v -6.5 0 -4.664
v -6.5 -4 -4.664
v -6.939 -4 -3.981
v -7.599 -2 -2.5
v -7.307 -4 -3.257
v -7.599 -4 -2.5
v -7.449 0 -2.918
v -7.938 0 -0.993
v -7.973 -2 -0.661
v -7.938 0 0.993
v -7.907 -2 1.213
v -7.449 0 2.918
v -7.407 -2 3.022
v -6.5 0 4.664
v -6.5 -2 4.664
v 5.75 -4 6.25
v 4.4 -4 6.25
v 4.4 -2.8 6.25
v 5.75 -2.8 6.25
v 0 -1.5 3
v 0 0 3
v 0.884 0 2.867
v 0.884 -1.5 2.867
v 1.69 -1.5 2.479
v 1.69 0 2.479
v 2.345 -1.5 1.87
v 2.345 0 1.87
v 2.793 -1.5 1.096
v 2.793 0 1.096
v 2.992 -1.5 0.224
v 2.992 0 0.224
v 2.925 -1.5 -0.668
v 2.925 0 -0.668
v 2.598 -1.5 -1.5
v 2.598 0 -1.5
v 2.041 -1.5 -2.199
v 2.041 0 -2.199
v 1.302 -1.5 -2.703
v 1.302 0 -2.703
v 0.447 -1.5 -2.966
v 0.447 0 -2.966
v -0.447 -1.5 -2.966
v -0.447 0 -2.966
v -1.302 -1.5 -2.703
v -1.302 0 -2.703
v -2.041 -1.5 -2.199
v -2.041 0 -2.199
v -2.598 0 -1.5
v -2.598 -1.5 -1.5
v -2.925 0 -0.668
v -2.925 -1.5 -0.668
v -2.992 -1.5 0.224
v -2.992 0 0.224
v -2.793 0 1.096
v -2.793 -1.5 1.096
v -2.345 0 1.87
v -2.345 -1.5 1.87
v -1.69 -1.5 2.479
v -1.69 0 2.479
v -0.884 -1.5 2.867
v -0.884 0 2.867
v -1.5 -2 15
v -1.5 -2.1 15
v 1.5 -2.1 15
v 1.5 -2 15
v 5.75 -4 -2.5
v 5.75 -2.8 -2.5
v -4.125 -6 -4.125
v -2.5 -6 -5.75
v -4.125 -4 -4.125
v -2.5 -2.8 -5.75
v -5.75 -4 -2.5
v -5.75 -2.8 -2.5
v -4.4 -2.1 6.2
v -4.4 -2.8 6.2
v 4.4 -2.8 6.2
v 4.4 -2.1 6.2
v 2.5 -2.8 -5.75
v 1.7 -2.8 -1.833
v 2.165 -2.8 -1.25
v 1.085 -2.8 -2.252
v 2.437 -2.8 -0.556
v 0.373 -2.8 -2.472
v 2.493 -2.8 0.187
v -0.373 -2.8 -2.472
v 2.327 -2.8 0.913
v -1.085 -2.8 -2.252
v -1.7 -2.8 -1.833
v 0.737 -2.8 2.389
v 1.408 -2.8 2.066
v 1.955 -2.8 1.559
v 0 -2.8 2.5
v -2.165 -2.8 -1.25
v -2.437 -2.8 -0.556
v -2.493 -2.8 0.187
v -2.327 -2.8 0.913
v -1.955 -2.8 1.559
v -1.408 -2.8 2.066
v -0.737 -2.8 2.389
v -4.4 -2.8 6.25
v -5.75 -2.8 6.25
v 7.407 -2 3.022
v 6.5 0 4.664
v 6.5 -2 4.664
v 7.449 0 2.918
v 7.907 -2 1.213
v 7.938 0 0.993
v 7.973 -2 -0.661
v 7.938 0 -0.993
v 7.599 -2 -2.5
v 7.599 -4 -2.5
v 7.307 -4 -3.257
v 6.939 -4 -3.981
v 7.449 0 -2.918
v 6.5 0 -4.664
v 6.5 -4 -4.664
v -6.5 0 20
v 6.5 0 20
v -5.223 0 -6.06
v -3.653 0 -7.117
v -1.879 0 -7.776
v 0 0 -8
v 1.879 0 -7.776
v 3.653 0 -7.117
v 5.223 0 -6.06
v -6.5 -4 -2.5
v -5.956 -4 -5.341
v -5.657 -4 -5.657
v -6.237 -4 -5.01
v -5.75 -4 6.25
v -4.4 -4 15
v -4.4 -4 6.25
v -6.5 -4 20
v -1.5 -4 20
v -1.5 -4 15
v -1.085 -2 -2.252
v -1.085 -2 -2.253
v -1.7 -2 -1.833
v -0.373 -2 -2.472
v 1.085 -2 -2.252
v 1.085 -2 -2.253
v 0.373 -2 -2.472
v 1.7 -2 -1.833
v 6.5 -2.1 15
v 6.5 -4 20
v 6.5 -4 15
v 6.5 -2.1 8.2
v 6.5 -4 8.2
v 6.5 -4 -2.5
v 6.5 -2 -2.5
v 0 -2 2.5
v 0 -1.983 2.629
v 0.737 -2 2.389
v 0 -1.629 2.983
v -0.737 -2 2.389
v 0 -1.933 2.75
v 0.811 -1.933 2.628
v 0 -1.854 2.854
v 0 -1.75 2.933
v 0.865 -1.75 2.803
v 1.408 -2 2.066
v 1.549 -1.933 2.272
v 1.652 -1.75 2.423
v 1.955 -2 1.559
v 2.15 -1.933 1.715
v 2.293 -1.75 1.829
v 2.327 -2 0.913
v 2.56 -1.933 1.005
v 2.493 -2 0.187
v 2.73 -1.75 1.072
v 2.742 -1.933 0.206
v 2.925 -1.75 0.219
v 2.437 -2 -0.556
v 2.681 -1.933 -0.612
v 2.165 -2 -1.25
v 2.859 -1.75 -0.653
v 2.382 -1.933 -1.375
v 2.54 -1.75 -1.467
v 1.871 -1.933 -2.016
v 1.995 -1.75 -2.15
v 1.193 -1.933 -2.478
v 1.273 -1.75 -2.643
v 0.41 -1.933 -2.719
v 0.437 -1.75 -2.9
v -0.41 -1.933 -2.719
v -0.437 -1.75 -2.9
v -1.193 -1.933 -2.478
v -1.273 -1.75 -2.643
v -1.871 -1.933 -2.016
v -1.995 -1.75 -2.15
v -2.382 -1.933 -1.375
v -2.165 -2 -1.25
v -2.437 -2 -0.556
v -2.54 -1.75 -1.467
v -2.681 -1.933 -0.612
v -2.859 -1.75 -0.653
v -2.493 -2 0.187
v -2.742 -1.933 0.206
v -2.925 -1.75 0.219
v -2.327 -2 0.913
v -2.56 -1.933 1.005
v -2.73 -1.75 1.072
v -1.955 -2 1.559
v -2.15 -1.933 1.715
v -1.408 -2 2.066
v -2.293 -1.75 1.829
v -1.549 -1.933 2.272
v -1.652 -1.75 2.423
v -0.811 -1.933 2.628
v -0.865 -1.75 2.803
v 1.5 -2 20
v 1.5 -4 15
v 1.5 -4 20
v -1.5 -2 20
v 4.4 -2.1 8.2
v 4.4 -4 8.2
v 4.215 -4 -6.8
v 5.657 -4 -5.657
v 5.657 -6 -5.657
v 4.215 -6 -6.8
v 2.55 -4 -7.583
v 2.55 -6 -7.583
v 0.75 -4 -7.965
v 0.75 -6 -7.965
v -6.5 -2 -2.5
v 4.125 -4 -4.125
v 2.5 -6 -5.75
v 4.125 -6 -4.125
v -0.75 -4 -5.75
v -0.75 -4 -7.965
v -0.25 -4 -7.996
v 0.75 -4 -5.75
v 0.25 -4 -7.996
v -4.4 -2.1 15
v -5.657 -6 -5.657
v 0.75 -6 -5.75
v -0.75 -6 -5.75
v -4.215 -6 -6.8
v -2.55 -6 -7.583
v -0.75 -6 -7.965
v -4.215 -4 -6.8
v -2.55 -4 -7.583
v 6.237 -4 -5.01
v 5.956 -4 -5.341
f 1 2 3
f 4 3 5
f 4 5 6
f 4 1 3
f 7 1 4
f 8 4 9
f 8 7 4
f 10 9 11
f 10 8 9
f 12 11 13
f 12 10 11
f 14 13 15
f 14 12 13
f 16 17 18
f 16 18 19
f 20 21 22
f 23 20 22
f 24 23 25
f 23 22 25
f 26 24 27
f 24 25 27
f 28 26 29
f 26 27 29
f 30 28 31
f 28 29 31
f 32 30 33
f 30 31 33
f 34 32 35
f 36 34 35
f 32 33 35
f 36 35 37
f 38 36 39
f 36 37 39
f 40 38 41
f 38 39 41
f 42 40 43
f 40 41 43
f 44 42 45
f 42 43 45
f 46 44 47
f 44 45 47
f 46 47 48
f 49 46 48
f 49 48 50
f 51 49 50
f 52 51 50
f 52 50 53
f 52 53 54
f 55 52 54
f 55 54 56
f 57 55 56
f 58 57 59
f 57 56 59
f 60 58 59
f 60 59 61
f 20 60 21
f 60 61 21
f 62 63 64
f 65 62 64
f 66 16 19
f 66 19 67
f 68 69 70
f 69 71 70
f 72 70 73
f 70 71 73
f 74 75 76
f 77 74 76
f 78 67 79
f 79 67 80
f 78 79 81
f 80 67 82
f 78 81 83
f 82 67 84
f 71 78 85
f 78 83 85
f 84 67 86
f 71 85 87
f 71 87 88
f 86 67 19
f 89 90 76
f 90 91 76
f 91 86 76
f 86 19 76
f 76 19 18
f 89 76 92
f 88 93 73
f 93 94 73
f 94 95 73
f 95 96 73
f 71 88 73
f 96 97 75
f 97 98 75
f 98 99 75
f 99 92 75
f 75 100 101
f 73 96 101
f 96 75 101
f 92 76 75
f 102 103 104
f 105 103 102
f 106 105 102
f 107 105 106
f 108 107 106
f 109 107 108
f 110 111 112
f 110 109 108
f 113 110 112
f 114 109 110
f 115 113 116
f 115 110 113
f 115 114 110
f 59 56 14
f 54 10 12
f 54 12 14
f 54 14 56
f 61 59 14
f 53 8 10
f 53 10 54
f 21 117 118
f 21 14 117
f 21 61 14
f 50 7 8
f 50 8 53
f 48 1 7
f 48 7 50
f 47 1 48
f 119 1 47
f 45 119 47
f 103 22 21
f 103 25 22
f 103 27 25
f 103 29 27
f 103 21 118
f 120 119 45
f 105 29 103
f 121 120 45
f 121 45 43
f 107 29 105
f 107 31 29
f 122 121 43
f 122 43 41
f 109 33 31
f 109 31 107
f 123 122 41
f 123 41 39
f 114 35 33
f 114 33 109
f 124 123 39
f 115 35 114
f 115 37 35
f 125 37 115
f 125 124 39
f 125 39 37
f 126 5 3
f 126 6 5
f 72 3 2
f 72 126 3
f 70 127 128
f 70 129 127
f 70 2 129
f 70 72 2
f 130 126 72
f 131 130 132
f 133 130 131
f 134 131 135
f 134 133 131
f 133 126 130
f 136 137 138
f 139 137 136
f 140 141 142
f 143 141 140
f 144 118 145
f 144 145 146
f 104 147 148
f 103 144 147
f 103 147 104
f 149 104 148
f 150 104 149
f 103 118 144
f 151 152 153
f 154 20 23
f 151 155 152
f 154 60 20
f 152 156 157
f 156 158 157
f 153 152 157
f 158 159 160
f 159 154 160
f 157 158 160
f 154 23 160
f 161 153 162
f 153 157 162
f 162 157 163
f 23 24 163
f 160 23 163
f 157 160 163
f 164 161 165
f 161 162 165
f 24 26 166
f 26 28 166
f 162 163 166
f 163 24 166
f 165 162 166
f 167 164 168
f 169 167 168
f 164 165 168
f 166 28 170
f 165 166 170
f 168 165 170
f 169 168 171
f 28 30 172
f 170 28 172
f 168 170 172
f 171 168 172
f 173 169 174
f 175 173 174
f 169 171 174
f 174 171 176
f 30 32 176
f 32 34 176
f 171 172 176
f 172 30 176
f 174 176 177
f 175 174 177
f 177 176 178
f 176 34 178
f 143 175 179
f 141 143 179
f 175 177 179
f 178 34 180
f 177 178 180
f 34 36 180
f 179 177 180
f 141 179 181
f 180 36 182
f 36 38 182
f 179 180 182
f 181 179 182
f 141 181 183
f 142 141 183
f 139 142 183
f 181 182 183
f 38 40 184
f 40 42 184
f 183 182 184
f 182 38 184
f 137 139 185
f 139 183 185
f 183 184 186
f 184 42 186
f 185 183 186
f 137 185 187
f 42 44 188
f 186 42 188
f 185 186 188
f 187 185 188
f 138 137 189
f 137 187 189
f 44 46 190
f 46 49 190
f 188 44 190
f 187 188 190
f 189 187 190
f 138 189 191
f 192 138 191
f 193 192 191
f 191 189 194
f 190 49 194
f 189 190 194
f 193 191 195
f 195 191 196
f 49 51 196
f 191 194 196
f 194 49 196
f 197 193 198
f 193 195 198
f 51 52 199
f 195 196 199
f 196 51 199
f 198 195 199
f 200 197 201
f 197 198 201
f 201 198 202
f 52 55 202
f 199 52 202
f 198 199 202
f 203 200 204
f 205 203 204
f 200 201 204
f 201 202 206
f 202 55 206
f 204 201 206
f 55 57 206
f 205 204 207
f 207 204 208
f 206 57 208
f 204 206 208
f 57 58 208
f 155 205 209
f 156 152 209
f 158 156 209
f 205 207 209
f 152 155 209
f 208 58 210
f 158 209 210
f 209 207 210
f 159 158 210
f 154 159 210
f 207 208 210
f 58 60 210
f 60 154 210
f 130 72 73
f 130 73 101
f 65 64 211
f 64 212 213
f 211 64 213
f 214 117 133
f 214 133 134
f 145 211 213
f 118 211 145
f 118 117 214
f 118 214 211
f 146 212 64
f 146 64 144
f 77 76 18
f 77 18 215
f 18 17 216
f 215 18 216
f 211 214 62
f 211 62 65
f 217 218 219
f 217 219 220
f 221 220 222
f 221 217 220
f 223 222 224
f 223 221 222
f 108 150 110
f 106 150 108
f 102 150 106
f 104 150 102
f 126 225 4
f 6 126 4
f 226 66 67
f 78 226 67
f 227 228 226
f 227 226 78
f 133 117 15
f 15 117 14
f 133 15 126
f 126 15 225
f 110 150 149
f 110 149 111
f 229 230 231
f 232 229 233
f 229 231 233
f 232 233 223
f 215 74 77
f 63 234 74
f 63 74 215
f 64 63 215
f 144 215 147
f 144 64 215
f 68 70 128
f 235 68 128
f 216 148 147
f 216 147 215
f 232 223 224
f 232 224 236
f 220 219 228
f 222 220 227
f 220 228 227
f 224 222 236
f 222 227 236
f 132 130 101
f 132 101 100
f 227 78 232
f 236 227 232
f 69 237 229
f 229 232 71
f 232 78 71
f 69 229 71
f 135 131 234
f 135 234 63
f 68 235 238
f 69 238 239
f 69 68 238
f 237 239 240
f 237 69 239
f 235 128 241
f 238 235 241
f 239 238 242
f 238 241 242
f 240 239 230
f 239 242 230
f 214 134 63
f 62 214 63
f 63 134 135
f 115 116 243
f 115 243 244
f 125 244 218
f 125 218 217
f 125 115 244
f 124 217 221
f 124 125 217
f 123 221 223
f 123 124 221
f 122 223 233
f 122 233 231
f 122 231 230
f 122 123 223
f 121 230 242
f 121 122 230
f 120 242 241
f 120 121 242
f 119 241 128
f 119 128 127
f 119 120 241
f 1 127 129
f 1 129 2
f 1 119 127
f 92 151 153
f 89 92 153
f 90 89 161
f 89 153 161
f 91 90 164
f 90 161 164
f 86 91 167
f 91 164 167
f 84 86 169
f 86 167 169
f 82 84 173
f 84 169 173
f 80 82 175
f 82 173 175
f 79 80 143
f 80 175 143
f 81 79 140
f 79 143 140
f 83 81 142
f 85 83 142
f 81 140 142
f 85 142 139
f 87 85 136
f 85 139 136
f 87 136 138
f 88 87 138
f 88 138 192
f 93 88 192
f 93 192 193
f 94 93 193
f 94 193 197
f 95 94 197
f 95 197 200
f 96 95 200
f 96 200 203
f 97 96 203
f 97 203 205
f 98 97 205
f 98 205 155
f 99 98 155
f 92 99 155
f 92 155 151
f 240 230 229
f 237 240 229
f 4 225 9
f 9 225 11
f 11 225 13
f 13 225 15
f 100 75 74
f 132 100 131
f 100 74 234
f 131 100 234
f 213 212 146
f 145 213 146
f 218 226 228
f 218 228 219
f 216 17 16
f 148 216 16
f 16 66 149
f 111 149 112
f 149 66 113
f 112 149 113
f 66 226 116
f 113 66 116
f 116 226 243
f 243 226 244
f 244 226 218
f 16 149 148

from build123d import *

# Parameters (mm, degrees)
BOSS_EXTRUDE1_DEPTH = 4
SKETCH2_R           = 2.5
CUT_EXTRUDE1_DEPTH  = 22.9089023
SKETCH3_R           = 3
CUT_EXTRUDE2_DEPTH  = 2
CUT_EXTRUDE3_DEPTH  = 1.2
CUT_EXTRUDE5_DEPTH  = 0.7
CUT_EXTRUDE8_START  = -2
CUT_EXTRUDE8_DEPTH  = 2
BOSS_EXTRUDE3_DEPTH = 2
FILLET3_R           = 0.5
CUT_EXTRUDE9_DEPTH  = 2
BOSS_EXTRUDE4_DEPTH = 1.9


with BuildPart() as part:
    # Sketch1 → Boss-Extrude1 (new body)
    with BuildSketch(Plane(origin=(0, 0, 0), x_dir=(1, 0, 0), z_dir=(0, 1, 0))):
        with BuildLine():
            Line((-6.5, -20), (6.5, -20))
            Line((6.5, -20), (6.5, -4.663689527))
            ThreePointArc((6.5, -4.663689527), (8, 0), (6.5, 4.663689527))
            ThreePointArc((6.5, 4.663689527), (0, 8), (-6.5, 4.663689527))
            ThreePointArc((-6.5, 4.663689527), (-8, 0), (-6.5, -4.663689527))
            Line((-6.5, -4.663689527), (-6.5, -20))
        make_face()
    extrude(amount=-BOSS_EXTRUDE1_DEPTH)

    # Sketch2 → Cut-Extrude1 (cut, through all)
    with BuildSketch(Plane(origin=(0, 0, 0), x_dir=(1, 0, 0), z_dir=(0, 1, 0))):
        with Locations(Location((0, 0, 0), (0, 0, 270))):
            Circle(SKETCH2_R)
    extrude(amount=-CUT_EXTRUDE1_DEPTH, mode=Mode.SUBTRACT)

    # Sketch3 → Cut-Extrude2 (cut)
    with BuildSketch(Plane(origin=(0, 0, 0), x_dir=(1, 0, 0), z_dir=(0, 1, 0))):
        with Locations(Location((0, 0, 0), (0, 0, 270))):
            Circle(SKETCH3_R)
    extrude(amount=-CUT_EXTRUDE2_DEPTH, mode=Mode.SUBTRACT)

    # Sketch4 → Cut-Extrude3 (cut)
    with BuildSketch(Plane.XZ.offset(4)):
        Polygon((2.5, -5.75), (-2.5, -5.75), (-5.75, -2.5), (-5.75, 6.25), (-4.4, 6.25), (-4.4, 8.2), (-5.660373569, 10), (-6.5, 10), (-6.5, 11.199110814), (-6.5, 15), (6.5, 15), (6.5, 11.199110814), (6.5, 10), (6.5, 8.2), (4.4, 8.2), (4.4, 6.25), (5.75, 6.25), (5.75, -2.5), align=None)
    extrude(amount=-CUT_EXTRUDE3_DEPTH, mode=Mode.SUBTRACT)

    # Sketch6 → Cut-Extrude5 (cut)
    with BuildSketch(Plane.XZ.offset(2.8)):
        Polygon((6.5, 8.2), (6.5, 15), (-6.5, 15), (-6.5, 11.199110814), (-5.660373569, 10), (-4.4, 8.2), (-4.4, 6.2), (4.4, 6.2), (4.4, 8.2), align=None)
    extrude(amount=-CUT_EXTRUDE5_DEPTH, mode=Mode.SUBTRACT)

    # Sketch10 → Cut-Extrude8 (cut)
    with BuildSketch(Plane.XZ.offset(4).offset(CUT_EXTRUDE8_START)):
        with BuildLine():
            Line((-6.5, 4.663689527), (-6.5, -2.5))
            Line((-6.5, -2.5), (-7.599342077, -2.5))
            ThreePointArc((-7.599342077, -2.5), (-7.907431546, 1.213476964), (-6.5, 4.663689527))
        make_face()
        with BuildLine():
            Line((6.5, 4.663689527), (6.5, -2.5))
            Line((6.5, -2.5), (7.599342077, -2.5))
            ThreePointArc((7.599342077, -2.5), (7.907431546, 1.213476964), (6.5, 4.663689527))
        make_face()
    extrude(amount=CUT_EXTRUDE8_DEPTH, mode=Mode.SUBTRACT)

    # Sketch11 → Boss-Extrude3 (add)
    with BuildSketch(Plane.XZ.offset(4)):
        with BuildLine():
            Line((-0.75, -7.964766161), (-0.75, -5.75))
            Line((-0.75, -5.75), (-2.5, -5.75))
            Line((-2.5, -5.75), (-4.125, -4.125))
            Line((-4.125, -4.125), (-5.656854249, -5.656854249))
            ThreePointArc((-5.656854249, -5.656854249), (-3.404931672, -7.239229262), (-0.75, -7.964766161))
        make_face()
        with BuildLine():
            Line((0.75, -7.964766161), (0.75, -5.75))
            Line((0.75, -5.75), (2.5, -5.75))
            Line((2.5, -5.75), (4.125, -4.125))
            Line((4.125, -4.125), (5.656854249, -5.656854249))
            ThreePointArc((5.656854249, -5.656854249), (3.404931672, -7.239229262), (0.75, -7.964766161))
        make_face()
    extrude(amount=BOSS_EXTRUDE3_DEPTH)

    # Fillet3
    fillet3_edges = [part.edges().sort_by_distance(p)[0] for p in [
        (0, -2, -3),
    ]]
    fillet(fillet3_edges, radius=FILLET3_R - 0.0001)  # a hair under: the kernel refuses the full size

    # Sketch12 → Cut-Extrude9 (cut)
    with BuildSketch(Plane.XZ.offset(4)):
        Polygon((0, 15), (1.5, 15), (1.5, 20), (-1.5, 20), (-1.5, 15), align=None)
    extrude(amount=-CUT_EXTRUDE9_DEPTH, mode=Mode.SUBTRACT)

    # Sketch13 → Boss-Extrude4 (add)
    with BuildSketch(Plane.XZ.offset(2.1)):
        Polygon((-6.5, 15), (-6.5, 10), (-5.660373569, 10), (-4.4, 8.2), (-4.4, 15), align=None)
    extrude(amount=BOSS_EXTRUDE4_DEPTH)


solid = part.part
